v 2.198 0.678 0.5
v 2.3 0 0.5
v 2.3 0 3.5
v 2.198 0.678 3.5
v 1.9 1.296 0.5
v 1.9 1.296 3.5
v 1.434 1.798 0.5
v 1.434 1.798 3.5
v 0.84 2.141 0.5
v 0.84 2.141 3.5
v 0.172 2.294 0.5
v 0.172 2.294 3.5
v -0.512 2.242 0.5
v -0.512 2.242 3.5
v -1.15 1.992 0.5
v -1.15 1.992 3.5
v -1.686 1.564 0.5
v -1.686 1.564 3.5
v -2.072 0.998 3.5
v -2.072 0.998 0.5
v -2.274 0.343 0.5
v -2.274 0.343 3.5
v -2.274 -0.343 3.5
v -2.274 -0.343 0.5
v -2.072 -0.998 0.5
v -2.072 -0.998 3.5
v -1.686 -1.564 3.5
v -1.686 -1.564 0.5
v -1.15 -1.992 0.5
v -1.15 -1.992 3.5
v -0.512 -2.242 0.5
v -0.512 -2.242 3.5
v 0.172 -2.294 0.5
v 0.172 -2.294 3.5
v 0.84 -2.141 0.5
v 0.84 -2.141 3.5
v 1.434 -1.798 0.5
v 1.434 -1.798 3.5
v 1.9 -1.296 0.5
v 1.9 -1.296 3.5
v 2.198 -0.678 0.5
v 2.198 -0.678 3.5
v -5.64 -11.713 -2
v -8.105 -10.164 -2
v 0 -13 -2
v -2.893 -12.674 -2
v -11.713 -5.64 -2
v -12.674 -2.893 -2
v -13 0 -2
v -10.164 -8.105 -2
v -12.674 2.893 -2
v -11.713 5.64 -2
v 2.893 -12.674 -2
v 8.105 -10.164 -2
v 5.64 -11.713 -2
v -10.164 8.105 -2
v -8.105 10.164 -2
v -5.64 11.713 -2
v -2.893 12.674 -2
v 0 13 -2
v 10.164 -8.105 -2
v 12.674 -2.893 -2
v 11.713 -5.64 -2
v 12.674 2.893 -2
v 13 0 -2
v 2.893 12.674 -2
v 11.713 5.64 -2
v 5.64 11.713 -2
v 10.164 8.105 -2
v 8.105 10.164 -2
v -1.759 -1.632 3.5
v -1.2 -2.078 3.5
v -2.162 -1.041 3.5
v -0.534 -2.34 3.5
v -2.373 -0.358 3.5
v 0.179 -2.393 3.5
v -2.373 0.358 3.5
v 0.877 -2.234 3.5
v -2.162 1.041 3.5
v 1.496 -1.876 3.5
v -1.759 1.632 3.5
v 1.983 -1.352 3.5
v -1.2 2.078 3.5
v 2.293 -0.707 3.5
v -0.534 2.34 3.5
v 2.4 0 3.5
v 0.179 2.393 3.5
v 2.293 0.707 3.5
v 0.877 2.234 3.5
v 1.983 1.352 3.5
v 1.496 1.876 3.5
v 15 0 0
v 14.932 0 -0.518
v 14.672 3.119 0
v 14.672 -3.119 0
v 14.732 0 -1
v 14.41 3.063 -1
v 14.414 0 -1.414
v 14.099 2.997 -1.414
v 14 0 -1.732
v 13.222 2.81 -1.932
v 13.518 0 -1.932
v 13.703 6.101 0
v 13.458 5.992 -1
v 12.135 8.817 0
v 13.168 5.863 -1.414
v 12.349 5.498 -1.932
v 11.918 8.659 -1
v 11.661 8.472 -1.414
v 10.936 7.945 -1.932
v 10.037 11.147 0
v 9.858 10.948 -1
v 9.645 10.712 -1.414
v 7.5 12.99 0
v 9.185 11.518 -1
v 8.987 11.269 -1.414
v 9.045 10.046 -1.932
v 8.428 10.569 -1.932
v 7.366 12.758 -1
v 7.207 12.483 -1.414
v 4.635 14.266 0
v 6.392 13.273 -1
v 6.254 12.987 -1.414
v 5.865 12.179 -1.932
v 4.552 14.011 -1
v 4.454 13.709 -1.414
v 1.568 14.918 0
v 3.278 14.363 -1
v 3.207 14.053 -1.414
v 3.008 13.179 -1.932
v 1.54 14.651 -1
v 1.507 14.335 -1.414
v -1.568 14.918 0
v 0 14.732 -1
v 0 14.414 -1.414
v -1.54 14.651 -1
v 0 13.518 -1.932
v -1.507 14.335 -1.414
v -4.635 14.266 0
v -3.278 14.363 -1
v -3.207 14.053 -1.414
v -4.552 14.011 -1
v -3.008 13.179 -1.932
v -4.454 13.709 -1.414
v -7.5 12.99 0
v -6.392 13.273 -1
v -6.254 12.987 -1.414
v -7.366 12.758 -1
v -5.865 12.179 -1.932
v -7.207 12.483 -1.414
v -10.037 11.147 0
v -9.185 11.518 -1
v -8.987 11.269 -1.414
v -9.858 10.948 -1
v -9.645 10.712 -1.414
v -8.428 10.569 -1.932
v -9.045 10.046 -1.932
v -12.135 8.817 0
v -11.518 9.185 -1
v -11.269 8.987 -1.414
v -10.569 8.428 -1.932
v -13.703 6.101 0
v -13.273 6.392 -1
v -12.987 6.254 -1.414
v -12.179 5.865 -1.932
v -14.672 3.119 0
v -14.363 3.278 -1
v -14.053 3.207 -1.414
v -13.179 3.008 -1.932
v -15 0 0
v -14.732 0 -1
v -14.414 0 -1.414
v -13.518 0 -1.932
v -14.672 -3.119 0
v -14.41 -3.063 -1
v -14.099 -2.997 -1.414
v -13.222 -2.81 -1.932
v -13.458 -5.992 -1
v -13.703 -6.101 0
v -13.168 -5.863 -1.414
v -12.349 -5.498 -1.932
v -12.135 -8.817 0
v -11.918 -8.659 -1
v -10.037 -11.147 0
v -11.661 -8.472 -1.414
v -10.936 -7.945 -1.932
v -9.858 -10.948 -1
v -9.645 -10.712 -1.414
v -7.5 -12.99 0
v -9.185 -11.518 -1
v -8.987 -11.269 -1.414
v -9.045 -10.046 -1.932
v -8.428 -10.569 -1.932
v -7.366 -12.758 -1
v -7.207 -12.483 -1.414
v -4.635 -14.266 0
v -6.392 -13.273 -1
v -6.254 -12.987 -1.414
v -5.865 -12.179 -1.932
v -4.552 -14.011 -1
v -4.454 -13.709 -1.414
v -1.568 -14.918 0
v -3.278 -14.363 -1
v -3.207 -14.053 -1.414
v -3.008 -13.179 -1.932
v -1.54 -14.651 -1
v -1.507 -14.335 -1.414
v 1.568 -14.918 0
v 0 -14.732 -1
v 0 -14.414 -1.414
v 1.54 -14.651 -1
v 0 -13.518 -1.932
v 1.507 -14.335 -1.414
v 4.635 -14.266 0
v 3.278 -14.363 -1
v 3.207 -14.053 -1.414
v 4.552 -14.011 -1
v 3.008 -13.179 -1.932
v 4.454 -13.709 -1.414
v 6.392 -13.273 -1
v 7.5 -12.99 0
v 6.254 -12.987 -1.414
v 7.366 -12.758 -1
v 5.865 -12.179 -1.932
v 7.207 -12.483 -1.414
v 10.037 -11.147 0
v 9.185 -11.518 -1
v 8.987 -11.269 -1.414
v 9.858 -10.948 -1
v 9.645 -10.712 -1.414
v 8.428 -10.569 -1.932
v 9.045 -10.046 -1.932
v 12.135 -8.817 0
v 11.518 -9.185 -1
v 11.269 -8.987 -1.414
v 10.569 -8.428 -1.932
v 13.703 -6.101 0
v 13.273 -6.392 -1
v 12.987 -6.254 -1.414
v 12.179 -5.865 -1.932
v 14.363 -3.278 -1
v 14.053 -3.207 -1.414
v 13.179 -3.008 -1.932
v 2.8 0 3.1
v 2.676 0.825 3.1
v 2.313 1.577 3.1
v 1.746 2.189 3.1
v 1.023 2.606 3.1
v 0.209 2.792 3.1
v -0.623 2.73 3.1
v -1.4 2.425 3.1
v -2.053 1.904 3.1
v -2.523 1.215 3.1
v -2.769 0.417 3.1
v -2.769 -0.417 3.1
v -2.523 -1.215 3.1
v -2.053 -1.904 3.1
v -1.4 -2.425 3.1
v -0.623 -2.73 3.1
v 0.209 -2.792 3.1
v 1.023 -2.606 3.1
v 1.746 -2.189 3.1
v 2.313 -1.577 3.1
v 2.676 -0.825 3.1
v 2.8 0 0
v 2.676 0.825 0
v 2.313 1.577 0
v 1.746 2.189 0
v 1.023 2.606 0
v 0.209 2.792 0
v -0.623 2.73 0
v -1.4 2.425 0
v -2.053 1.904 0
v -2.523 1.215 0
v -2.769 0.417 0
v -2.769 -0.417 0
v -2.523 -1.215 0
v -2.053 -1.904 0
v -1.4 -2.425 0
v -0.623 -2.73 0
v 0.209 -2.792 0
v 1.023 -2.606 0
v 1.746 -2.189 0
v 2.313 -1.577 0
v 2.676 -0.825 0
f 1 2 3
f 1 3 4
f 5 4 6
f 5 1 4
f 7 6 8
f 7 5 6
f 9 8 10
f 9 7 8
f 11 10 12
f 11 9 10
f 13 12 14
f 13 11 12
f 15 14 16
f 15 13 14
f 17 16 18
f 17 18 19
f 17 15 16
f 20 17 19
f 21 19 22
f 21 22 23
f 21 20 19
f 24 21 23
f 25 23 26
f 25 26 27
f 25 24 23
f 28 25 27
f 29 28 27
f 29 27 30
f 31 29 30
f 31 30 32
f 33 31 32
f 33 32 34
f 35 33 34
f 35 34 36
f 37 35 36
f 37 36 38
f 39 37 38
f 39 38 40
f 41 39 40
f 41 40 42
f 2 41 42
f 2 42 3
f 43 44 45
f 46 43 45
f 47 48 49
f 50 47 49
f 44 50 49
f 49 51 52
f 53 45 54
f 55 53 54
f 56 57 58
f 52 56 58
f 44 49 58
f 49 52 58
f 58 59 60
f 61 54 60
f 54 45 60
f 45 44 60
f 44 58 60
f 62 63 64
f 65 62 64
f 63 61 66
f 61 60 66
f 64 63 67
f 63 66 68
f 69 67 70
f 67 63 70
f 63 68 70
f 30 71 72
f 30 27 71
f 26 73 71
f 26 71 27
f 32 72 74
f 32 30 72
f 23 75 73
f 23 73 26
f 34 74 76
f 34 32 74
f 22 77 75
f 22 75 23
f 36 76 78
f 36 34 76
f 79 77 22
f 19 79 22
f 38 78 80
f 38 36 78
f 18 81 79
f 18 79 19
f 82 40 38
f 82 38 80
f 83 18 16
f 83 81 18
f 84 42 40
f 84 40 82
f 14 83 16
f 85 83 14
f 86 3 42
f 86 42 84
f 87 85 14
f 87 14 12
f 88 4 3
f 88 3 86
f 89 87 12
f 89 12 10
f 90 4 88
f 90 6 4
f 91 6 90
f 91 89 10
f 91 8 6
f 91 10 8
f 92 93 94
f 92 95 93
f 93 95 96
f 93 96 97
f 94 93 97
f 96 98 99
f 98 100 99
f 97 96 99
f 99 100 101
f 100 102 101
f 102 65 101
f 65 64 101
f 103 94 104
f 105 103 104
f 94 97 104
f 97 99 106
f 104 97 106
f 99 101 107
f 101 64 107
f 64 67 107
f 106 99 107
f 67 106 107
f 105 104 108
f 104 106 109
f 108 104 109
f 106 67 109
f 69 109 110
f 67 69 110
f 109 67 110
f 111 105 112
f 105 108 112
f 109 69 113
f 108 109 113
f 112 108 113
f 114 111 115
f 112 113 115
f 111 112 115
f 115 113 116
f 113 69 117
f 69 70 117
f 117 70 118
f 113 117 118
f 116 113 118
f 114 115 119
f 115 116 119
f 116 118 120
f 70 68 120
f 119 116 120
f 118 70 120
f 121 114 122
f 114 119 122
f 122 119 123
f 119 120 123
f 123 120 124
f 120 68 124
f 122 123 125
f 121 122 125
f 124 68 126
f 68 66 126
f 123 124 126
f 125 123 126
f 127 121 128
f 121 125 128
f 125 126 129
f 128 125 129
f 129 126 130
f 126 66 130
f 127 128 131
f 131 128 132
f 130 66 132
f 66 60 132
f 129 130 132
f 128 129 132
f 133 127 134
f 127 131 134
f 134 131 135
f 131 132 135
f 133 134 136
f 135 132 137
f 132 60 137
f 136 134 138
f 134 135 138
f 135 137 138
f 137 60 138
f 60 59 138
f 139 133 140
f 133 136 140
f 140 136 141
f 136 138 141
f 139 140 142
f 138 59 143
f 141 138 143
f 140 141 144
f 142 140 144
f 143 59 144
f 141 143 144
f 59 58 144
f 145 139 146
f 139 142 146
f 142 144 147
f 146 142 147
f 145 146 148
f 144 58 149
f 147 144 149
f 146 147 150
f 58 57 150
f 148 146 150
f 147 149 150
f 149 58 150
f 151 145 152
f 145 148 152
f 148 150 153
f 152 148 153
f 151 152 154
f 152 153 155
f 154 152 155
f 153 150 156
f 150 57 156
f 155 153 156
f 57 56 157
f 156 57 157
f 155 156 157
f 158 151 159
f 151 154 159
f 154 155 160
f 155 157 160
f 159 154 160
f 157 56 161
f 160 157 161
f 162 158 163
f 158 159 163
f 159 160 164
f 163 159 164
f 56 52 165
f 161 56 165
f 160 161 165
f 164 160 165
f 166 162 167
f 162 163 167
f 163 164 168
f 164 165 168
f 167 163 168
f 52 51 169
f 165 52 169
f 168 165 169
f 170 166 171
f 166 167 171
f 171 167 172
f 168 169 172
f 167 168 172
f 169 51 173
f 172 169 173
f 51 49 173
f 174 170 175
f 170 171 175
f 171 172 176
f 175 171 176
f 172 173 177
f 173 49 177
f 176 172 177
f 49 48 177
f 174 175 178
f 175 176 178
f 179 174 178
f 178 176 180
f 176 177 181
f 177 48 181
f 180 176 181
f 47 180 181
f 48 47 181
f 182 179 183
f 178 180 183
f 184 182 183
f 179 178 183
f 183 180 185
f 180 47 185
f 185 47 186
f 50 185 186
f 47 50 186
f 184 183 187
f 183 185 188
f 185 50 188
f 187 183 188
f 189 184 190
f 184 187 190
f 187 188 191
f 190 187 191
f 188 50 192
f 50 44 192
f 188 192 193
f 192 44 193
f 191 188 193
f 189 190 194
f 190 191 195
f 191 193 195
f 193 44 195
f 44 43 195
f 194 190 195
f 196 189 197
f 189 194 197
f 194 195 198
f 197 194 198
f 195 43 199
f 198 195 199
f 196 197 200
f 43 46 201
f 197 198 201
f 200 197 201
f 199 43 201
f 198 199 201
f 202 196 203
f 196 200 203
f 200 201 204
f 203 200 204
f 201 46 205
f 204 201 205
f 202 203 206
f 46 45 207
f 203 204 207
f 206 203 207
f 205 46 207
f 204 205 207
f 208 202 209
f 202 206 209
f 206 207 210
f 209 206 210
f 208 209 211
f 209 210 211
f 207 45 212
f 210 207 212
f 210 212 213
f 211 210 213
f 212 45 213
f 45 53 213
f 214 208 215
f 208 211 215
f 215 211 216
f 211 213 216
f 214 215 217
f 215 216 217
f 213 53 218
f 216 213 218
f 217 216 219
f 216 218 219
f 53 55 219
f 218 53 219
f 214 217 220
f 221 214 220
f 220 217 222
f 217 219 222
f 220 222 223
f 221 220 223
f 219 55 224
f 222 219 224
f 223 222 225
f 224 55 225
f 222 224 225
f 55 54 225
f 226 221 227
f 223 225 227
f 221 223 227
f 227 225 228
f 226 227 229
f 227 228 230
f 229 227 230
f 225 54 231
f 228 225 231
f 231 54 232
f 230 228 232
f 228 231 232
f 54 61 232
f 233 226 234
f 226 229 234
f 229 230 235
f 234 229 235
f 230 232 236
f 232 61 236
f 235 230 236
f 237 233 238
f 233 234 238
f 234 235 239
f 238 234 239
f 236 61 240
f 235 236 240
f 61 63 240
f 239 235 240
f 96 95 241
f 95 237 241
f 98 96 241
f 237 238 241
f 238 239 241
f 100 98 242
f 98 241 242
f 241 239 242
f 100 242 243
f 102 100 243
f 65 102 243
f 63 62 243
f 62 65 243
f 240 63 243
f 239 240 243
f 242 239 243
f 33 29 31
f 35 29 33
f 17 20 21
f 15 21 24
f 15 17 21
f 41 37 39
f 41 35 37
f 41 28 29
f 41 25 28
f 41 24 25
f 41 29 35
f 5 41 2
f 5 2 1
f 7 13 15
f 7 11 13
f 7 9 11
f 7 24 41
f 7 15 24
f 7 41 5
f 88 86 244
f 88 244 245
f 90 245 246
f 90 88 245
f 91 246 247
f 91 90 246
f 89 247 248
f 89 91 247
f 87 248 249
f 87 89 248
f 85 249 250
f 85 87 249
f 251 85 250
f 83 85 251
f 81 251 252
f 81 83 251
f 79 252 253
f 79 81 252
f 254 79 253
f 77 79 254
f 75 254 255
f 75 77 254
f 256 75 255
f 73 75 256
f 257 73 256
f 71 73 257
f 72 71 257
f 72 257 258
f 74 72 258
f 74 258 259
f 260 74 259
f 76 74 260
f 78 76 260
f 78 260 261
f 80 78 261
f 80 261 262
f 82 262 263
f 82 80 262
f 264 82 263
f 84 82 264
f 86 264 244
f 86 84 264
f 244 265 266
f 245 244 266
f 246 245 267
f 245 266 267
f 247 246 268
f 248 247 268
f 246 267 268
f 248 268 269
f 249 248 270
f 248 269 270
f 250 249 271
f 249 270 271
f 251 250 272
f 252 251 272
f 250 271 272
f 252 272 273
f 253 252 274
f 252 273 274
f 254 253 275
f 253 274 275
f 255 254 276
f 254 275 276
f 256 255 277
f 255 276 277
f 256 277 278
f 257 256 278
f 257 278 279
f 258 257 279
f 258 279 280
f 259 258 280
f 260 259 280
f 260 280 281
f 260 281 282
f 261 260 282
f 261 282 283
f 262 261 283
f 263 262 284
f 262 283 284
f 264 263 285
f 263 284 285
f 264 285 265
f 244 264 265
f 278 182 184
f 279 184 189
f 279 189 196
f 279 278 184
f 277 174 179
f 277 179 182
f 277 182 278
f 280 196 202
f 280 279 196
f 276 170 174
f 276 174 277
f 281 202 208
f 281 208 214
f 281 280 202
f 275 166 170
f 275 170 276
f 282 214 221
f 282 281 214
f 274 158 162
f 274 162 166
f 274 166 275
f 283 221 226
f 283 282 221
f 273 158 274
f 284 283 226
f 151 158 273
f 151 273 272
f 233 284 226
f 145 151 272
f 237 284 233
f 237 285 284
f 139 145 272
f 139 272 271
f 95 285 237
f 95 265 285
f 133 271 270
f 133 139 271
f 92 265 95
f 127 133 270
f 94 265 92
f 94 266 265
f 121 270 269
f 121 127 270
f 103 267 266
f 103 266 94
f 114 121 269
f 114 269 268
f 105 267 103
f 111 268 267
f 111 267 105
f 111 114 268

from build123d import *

# Parameters (mm, degrees)
F0_R      = 2.8
F1_DEPTH  = 3.5
F2_T      = -0.5
F0_R_2    = 15
F1_FACE_R = 2.8
F3_DEPTH  = 2
F4_R      = 1.99999
F5_SIZE   = 0.4


# Not quite as in the source:
# - a fillet or chamfer is up to 0.001 mm smaller than in the source, because OpenCascade refuses the exact size


with BuildPart() as f1:
    # F0 (on Top) → F1 (new body)
    with BuildSketch(Plane.XY):
        Circle(F0_R)
    extrude(amount=F1_DEPTH)

    # F2
    f2_openings = [f1.faces().sort_by_distance(p)[0] for p in [
        (0, 0, 3.5),
    ]]
    offset(amount=F2_T, openings=f2_openings)

    # F0 (on Top) + F1_face (on face) → F3 (join)
    with BuildSketch(Plane.XY):
        Circle(F0_R_2)
        Circle(F0_R, mode=Mode.SUBTRACT)
    with BuildSketch(Plane(origin=(0, 0, 0), x_dir=(1, 0, 0), z_dir=(0, 0, -1))):
        Circle(F1_FACE_R)
    extrude(amount=-F3_DEPTH, dir=(0, 0, 1))

    # F4 (radius 2 in the source; OpenCascade refuses exactly that, so slightly less here)
    f4_edges = [f1.edges().sort_by_distance(p)[0] for p in [
        (-15, 0, -2),
    ]]
    fillet(f4_edges, radius=F4_R)

    # F5
    f5_edges = [f1.edges().sort_by_distance(p)[0] for p in [
        (-2.8, 0, 3.5),
    ]]
    chamfer(f5_edges, length=F5_SIZE)


solid = f1.part
